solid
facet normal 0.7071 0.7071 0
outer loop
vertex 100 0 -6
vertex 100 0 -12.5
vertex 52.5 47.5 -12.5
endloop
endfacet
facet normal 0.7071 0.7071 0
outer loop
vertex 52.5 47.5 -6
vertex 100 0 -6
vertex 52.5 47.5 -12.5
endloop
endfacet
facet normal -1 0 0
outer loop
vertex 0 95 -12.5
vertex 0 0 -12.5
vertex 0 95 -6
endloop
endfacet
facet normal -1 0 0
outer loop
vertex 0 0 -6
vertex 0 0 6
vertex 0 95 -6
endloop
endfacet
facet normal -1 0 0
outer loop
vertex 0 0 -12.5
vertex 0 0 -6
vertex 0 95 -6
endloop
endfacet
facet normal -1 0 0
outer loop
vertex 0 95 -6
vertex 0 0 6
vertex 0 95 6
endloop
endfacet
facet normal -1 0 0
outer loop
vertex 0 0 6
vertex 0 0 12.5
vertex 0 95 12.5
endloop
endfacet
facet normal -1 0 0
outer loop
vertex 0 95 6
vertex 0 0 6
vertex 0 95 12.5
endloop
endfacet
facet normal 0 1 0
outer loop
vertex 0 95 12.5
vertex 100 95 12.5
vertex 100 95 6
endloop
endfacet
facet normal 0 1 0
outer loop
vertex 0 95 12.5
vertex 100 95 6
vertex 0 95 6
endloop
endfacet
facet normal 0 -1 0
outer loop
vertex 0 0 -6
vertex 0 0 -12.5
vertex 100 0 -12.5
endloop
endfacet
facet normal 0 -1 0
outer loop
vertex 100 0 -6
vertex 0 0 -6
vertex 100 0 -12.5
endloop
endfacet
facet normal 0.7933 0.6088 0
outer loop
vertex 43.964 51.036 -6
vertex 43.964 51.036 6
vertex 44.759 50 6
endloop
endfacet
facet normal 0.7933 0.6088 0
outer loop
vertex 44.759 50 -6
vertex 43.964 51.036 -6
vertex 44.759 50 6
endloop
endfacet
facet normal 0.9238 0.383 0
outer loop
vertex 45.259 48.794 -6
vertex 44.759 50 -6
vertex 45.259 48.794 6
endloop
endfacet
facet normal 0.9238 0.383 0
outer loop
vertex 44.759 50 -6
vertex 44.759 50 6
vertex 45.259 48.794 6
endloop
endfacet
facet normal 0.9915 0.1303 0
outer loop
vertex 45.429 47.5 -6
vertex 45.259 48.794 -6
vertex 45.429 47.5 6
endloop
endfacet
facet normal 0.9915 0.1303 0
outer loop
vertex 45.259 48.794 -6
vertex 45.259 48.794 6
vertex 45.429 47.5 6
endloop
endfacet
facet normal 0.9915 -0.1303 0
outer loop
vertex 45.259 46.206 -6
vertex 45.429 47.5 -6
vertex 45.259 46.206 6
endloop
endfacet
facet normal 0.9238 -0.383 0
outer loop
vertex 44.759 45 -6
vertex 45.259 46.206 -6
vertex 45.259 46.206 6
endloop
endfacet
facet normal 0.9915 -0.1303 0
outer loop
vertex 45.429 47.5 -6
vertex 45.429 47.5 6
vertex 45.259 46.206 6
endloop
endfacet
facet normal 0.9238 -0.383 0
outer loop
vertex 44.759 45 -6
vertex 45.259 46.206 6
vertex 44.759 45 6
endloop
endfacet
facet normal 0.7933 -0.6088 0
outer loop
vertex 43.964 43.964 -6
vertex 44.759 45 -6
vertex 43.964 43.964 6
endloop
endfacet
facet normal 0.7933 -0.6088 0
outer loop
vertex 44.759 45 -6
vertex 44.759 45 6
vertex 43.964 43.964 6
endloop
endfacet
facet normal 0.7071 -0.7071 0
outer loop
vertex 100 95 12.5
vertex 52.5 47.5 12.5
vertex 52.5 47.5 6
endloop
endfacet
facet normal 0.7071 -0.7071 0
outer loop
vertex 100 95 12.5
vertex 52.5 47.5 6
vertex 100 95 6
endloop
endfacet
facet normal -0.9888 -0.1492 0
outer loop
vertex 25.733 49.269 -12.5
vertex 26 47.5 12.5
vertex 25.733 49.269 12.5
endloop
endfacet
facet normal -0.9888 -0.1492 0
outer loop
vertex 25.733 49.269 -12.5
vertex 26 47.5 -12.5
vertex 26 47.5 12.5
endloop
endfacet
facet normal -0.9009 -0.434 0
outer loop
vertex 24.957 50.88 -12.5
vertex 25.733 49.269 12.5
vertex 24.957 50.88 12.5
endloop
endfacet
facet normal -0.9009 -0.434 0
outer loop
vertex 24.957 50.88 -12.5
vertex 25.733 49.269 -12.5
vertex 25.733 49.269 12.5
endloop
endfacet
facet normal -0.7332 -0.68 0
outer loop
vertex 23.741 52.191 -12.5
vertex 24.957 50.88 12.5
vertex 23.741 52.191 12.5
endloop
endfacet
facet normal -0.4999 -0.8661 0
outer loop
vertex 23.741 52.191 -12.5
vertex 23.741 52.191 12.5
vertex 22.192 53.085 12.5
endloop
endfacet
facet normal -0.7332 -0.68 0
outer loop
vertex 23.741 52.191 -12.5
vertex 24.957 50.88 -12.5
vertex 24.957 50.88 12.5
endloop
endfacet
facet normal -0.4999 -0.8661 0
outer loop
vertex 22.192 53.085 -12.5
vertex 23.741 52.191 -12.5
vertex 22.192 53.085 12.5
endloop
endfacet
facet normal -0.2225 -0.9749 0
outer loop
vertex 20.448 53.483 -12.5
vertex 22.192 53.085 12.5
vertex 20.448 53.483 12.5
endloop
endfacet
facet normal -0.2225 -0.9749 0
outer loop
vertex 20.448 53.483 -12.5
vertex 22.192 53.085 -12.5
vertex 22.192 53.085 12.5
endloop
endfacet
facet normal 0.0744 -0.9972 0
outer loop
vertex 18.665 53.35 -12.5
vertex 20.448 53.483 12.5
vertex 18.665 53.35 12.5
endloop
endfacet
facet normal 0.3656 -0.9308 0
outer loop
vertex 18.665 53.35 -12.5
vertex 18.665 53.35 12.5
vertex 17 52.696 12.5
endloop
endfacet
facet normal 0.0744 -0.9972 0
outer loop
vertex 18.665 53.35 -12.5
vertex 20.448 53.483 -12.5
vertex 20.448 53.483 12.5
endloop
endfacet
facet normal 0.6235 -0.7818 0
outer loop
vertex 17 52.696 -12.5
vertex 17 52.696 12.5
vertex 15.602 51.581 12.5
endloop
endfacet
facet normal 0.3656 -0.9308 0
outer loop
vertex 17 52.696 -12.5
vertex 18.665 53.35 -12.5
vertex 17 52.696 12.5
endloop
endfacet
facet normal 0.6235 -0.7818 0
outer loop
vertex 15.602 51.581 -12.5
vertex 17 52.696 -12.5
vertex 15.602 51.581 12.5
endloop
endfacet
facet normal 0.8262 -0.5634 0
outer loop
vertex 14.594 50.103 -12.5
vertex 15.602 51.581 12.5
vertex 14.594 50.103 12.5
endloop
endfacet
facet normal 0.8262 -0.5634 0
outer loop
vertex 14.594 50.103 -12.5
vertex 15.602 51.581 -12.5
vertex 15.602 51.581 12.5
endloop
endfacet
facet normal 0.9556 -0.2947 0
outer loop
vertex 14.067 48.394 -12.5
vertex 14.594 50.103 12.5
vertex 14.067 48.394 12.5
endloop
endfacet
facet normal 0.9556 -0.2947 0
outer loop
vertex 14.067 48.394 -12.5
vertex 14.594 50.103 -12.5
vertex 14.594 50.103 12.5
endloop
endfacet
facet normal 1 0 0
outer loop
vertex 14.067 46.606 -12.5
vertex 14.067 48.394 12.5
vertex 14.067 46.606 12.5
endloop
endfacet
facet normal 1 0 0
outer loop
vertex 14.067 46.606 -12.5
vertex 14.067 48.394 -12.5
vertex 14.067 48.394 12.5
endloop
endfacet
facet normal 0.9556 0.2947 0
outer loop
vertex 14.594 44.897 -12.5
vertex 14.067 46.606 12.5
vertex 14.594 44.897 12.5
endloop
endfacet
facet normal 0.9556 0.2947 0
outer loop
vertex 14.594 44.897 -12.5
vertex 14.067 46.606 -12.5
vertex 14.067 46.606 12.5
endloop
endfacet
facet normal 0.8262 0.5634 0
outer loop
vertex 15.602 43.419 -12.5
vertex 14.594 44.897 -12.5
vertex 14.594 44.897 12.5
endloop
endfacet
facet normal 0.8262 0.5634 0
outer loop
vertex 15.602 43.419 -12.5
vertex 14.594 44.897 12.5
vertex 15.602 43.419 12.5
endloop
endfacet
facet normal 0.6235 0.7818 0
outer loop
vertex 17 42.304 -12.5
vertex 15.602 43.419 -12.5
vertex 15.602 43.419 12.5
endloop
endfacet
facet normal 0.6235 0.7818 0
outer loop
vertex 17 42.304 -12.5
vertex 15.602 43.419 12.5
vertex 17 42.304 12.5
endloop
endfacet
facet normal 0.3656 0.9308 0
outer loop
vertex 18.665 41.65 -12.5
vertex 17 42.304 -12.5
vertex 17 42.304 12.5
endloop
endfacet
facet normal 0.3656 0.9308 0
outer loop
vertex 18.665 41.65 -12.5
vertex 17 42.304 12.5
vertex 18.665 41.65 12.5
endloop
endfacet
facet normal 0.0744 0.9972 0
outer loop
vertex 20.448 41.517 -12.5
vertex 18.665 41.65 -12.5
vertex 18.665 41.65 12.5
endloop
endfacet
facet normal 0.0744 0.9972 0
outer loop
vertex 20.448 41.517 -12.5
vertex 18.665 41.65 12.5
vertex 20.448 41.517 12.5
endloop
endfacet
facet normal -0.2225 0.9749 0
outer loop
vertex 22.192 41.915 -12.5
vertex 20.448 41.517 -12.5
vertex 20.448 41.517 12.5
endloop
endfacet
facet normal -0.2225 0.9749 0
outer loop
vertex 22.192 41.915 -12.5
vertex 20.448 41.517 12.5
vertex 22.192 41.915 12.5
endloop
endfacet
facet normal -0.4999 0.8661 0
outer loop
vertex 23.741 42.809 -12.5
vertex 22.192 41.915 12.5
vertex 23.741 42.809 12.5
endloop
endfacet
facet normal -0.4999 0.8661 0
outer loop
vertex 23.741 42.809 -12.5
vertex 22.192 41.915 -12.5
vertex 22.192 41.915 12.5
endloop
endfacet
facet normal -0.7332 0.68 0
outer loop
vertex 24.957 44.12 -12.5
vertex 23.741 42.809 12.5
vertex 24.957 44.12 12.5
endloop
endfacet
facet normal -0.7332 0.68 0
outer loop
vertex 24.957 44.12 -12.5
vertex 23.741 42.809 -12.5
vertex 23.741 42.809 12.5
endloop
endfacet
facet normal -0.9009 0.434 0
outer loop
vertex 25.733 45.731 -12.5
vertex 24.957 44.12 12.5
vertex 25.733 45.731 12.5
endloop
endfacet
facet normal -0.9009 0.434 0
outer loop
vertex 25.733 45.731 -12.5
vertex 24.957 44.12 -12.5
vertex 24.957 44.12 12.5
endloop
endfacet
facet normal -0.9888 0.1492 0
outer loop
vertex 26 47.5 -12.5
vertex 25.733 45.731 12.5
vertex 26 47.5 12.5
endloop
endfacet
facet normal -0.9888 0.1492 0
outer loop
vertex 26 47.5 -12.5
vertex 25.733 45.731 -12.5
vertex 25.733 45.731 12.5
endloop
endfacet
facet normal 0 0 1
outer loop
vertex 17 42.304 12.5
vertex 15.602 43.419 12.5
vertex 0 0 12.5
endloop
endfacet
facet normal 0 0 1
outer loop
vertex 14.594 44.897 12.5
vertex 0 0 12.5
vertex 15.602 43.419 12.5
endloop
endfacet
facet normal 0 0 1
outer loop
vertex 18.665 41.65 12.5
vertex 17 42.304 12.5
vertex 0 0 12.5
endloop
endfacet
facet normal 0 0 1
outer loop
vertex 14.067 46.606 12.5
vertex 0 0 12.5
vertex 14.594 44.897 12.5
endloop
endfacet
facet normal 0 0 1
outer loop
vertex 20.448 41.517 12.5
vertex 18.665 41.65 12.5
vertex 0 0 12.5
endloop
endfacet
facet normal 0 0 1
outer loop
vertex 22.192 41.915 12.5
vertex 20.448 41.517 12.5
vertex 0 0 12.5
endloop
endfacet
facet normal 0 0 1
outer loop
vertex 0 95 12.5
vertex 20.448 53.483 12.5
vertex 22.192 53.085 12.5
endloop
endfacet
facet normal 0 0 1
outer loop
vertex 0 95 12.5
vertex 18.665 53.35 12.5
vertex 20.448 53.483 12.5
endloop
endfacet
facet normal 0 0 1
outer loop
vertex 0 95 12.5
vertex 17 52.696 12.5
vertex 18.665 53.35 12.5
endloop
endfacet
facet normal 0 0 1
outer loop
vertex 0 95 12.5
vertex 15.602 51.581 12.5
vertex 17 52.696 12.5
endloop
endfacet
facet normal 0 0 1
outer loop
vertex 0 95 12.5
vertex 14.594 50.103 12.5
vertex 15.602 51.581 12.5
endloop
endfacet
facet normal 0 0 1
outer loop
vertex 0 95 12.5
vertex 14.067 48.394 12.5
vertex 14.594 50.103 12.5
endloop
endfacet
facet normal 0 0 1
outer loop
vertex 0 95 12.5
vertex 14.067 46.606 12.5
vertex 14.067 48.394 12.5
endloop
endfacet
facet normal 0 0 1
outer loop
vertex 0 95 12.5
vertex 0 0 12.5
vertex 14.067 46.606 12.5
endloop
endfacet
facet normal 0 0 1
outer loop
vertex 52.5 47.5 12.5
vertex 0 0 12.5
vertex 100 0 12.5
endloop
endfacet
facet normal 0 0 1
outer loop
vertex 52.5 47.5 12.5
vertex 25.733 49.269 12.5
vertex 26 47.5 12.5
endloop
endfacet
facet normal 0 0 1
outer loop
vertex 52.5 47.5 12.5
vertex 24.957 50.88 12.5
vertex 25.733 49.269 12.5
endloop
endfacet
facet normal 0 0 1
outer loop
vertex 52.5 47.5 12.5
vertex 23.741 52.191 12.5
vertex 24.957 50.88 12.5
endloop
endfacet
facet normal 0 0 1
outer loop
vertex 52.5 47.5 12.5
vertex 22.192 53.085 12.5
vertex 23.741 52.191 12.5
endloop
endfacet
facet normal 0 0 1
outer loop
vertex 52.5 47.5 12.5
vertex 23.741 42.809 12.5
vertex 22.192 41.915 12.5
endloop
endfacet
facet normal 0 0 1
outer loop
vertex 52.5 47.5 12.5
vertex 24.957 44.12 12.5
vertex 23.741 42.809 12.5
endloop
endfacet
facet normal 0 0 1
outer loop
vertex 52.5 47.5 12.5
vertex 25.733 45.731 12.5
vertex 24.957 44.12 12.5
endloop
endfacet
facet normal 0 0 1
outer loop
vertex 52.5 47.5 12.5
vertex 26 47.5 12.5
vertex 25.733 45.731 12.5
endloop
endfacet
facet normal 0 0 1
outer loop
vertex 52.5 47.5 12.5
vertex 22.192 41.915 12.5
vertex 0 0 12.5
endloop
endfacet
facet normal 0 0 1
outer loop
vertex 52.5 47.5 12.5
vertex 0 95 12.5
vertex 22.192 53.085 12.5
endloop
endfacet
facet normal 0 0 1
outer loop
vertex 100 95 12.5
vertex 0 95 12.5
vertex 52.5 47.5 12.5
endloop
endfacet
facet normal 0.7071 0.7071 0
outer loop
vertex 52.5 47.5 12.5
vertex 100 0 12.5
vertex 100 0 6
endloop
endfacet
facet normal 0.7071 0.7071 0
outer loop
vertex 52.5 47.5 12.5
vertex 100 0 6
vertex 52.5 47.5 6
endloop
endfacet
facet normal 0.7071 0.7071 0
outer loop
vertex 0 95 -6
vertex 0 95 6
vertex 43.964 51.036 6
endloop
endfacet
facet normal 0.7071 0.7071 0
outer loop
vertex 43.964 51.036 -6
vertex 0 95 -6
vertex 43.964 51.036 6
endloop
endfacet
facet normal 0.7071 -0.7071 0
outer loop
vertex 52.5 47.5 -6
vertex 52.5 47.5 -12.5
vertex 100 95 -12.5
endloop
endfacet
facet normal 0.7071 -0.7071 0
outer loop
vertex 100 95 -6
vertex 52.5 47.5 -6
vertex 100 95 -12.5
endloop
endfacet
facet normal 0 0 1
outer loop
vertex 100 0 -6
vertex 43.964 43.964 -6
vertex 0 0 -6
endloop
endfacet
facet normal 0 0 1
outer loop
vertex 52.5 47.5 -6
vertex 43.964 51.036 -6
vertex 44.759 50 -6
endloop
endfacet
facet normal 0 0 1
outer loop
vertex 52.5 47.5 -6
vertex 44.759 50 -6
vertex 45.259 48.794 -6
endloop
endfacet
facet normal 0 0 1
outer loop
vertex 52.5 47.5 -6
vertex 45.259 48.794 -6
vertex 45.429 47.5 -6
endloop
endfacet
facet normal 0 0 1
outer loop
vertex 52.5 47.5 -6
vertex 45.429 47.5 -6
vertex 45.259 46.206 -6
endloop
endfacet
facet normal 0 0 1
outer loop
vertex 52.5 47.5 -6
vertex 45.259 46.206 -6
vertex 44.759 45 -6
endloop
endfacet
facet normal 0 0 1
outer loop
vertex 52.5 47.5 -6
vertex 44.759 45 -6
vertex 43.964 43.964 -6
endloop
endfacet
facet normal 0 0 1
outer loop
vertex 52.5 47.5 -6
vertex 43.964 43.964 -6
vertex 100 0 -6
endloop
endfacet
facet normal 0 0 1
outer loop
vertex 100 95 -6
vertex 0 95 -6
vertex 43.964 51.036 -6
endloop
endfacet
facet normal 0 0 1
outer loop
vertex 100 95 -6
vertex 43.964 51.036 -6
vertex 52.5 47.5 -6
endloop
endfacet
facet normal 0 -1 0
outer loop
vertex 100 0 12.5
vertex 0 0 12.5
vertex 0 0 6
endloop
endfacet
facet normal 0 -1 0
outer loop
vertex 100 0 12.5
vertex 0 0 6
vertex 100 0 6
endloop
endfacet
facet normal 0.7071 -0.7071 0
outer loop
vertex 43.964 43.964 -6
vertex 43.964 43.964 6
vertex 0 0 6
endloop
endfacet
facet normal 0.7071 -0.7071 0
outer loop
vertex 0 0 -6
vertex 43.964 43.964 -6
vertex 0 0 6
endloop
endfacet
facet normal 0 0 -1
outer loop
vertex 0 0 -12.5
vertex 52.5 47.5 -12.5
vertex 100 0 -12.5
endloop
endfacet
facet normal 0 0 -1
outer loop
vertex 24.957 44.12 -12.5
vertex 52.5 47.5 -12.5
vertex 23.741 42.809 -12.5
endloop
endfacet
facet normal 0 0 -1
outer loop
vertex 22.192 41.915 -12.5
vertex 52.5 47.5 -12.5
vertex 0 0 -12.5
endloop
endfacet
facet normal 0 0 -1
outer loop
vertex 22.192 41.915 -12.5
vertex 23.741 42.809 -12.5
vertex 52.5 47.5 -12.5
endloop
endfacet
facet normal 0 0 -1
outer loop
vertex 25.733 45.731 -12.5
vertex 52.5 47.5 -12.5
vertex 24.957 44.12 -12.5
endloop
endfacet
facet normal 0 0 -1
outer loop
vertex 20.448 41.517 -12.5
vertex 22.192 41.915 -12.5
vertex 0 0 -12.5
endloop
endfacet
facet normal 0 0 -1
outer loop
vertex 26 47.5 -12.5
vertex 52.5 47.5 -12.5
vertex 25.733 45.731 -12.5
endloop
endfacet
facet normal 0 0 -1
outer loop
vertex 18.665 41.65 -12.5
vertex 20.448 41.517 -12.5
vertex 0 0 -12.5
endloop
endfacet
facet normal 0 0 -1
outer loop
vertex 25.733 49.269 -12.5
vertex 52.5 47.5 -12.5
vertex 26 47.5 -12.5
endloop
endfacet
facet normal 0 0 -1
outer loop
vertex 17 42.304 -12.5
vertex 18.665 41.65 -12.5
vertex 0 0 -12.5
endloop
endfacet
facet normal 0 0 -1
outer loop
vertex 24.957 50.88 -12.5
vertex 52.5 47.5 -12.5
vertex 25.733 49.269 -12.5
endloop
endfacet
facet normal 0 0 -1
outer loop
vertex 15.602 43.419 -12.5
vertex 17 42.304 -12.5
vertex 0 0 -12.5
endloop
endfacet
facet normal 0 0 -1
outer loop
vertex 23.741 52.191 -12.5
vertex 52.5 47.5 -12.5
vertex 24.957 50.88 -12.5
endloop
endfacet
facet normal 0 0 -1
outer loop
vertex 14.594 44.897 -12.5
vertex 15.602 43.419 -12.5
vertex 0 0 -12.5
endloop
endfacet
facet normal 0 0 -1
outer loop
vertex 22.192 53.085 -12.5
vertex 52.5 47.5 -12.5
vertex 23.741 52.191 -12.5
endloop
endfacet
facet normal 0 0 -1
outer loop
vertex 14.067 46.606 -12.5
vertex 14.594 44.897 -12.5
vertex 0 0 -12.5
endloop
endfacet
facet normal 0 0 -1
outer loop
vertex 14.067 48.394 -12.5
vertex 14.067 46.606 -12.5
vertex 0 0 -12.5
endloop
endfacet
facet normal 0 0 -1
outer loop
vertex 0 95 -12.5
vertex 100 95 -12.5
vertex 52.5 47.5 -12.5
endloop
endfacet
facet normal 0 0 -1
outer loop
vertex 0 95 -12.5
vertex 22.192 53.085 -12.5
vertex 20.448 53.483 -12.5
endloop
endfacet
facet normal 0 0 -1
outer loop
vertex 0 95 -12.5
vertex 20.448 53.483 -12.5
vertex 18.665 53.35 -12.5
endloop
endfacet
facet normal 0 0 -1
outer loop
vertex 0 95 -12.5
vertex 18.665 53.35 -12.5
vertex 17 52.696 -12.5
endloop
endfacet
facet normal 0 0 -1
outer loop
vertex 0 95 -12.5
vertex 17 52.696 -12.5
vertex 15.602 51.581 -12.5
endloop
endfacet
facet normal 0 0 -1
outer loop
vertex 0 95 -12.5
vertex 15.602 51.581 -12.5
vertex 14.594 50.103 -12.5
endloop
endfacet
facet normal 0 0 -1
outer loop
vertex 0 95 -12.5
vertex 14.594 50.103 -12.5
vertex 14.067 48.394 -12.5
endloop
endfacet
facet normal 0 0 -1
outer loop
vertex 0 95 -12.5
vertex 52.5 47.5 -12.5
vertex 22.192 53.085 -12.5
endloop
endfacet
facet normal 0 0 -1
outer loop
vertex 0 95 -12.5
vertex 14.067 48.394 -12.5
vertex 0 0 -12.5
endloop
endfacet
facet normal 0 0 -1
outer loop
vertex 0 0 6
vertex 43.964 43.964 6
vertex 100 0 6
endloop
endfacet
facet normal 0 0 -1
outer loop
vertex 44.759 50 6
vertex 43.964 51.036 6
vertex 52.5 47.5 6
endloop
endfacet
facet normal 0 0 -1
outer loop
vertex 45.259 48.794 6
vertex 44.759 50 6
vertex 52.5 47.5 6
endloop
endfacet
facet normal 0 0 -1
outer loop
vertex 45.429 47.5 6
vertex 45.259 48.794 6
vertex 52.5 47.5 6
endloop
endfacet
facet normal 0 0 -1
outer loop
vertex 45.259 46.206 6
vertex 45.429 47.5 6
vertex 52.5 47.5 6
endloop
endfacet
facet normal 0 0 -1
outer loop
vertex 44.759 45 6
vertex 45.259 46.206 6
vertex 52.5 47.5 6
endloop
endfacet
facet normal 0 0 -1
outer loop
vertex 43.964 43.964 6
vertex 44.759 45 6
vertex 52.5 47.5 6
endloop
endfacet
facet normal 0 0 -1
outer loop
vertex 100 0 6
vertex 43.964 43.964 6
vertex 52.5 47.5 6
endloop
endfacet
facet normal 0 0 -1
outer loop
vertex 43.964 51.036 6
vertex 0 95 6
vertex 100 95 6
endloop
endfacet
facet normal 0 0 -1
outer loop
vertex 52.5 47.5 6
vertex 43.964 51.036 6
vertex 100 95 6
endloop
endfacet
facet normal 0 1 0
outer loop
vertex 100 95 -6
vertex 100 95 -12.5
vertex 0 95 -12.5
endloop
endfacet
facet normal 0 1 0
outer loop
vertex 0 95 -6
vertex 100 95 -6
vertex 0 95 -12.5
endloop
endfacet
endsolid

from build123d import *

# Parameters (mm, degrees)
BOSS_EXTRUDE1_START = -12.5
BOSS_EXTRUDE1_DEPTH = 6.5
SKETCH1_3_R         = 6
BOSS_EXTRUDE2_DEPTH = 12.5


with BuildPart() as part:
    # Sketch1 → Boss-Extrude1 (new body)
    with BuildSketch(Plane.XY.offset(BOSS_EXTRUDE1_START)):
        with BuildLine():
            Line((52.5, 47.5), (100, 95))
            Line((100, 95), (0, 95))
            Line((0, 95), (43.964466094, 51.035533906))
            ThreePointArc((43.964466094, 51.035533906), (45.428932188, 47.5), (43.964466094, 43.964466094))
            Line((43.964466094, 43.964466094), (0, 0))
            Line((0, 0), (100, 0))
            Line((100, 0), (52.5, 47.5))
        make_face()
    boss_extrude1 = extrude(amount=BOSS_EXTRUDE1_DEPTH)

    # Sketch1<3> → Boss-Extrude2 (add, symmetric)
    with BuildSketch(Plane.XY):
        with BuildLine():
            Line((43.964466094, 51.035533906), (0, 95))
            Line((0, 95), (0, 0))
            Line((0, 0), (43.964466094, 43.964466094))
            ThreePointArc((43.964466094, 43.964466094), (45.428932188, 47.5), (43.964466094, 51.035533906))
        make_face()
        with Locations((20, 47.5)):
            Circle(SKETCH1_3_R, mode=Mode.SUBTRACT)
    extrude(amount=BOSS_EXTRUDE2_DEPTH, both=True)

    # Mirror2: Boss-Extrude1 across plane
    add(boss_extrude1.mirror(Plane.XY))


solid = part.part
